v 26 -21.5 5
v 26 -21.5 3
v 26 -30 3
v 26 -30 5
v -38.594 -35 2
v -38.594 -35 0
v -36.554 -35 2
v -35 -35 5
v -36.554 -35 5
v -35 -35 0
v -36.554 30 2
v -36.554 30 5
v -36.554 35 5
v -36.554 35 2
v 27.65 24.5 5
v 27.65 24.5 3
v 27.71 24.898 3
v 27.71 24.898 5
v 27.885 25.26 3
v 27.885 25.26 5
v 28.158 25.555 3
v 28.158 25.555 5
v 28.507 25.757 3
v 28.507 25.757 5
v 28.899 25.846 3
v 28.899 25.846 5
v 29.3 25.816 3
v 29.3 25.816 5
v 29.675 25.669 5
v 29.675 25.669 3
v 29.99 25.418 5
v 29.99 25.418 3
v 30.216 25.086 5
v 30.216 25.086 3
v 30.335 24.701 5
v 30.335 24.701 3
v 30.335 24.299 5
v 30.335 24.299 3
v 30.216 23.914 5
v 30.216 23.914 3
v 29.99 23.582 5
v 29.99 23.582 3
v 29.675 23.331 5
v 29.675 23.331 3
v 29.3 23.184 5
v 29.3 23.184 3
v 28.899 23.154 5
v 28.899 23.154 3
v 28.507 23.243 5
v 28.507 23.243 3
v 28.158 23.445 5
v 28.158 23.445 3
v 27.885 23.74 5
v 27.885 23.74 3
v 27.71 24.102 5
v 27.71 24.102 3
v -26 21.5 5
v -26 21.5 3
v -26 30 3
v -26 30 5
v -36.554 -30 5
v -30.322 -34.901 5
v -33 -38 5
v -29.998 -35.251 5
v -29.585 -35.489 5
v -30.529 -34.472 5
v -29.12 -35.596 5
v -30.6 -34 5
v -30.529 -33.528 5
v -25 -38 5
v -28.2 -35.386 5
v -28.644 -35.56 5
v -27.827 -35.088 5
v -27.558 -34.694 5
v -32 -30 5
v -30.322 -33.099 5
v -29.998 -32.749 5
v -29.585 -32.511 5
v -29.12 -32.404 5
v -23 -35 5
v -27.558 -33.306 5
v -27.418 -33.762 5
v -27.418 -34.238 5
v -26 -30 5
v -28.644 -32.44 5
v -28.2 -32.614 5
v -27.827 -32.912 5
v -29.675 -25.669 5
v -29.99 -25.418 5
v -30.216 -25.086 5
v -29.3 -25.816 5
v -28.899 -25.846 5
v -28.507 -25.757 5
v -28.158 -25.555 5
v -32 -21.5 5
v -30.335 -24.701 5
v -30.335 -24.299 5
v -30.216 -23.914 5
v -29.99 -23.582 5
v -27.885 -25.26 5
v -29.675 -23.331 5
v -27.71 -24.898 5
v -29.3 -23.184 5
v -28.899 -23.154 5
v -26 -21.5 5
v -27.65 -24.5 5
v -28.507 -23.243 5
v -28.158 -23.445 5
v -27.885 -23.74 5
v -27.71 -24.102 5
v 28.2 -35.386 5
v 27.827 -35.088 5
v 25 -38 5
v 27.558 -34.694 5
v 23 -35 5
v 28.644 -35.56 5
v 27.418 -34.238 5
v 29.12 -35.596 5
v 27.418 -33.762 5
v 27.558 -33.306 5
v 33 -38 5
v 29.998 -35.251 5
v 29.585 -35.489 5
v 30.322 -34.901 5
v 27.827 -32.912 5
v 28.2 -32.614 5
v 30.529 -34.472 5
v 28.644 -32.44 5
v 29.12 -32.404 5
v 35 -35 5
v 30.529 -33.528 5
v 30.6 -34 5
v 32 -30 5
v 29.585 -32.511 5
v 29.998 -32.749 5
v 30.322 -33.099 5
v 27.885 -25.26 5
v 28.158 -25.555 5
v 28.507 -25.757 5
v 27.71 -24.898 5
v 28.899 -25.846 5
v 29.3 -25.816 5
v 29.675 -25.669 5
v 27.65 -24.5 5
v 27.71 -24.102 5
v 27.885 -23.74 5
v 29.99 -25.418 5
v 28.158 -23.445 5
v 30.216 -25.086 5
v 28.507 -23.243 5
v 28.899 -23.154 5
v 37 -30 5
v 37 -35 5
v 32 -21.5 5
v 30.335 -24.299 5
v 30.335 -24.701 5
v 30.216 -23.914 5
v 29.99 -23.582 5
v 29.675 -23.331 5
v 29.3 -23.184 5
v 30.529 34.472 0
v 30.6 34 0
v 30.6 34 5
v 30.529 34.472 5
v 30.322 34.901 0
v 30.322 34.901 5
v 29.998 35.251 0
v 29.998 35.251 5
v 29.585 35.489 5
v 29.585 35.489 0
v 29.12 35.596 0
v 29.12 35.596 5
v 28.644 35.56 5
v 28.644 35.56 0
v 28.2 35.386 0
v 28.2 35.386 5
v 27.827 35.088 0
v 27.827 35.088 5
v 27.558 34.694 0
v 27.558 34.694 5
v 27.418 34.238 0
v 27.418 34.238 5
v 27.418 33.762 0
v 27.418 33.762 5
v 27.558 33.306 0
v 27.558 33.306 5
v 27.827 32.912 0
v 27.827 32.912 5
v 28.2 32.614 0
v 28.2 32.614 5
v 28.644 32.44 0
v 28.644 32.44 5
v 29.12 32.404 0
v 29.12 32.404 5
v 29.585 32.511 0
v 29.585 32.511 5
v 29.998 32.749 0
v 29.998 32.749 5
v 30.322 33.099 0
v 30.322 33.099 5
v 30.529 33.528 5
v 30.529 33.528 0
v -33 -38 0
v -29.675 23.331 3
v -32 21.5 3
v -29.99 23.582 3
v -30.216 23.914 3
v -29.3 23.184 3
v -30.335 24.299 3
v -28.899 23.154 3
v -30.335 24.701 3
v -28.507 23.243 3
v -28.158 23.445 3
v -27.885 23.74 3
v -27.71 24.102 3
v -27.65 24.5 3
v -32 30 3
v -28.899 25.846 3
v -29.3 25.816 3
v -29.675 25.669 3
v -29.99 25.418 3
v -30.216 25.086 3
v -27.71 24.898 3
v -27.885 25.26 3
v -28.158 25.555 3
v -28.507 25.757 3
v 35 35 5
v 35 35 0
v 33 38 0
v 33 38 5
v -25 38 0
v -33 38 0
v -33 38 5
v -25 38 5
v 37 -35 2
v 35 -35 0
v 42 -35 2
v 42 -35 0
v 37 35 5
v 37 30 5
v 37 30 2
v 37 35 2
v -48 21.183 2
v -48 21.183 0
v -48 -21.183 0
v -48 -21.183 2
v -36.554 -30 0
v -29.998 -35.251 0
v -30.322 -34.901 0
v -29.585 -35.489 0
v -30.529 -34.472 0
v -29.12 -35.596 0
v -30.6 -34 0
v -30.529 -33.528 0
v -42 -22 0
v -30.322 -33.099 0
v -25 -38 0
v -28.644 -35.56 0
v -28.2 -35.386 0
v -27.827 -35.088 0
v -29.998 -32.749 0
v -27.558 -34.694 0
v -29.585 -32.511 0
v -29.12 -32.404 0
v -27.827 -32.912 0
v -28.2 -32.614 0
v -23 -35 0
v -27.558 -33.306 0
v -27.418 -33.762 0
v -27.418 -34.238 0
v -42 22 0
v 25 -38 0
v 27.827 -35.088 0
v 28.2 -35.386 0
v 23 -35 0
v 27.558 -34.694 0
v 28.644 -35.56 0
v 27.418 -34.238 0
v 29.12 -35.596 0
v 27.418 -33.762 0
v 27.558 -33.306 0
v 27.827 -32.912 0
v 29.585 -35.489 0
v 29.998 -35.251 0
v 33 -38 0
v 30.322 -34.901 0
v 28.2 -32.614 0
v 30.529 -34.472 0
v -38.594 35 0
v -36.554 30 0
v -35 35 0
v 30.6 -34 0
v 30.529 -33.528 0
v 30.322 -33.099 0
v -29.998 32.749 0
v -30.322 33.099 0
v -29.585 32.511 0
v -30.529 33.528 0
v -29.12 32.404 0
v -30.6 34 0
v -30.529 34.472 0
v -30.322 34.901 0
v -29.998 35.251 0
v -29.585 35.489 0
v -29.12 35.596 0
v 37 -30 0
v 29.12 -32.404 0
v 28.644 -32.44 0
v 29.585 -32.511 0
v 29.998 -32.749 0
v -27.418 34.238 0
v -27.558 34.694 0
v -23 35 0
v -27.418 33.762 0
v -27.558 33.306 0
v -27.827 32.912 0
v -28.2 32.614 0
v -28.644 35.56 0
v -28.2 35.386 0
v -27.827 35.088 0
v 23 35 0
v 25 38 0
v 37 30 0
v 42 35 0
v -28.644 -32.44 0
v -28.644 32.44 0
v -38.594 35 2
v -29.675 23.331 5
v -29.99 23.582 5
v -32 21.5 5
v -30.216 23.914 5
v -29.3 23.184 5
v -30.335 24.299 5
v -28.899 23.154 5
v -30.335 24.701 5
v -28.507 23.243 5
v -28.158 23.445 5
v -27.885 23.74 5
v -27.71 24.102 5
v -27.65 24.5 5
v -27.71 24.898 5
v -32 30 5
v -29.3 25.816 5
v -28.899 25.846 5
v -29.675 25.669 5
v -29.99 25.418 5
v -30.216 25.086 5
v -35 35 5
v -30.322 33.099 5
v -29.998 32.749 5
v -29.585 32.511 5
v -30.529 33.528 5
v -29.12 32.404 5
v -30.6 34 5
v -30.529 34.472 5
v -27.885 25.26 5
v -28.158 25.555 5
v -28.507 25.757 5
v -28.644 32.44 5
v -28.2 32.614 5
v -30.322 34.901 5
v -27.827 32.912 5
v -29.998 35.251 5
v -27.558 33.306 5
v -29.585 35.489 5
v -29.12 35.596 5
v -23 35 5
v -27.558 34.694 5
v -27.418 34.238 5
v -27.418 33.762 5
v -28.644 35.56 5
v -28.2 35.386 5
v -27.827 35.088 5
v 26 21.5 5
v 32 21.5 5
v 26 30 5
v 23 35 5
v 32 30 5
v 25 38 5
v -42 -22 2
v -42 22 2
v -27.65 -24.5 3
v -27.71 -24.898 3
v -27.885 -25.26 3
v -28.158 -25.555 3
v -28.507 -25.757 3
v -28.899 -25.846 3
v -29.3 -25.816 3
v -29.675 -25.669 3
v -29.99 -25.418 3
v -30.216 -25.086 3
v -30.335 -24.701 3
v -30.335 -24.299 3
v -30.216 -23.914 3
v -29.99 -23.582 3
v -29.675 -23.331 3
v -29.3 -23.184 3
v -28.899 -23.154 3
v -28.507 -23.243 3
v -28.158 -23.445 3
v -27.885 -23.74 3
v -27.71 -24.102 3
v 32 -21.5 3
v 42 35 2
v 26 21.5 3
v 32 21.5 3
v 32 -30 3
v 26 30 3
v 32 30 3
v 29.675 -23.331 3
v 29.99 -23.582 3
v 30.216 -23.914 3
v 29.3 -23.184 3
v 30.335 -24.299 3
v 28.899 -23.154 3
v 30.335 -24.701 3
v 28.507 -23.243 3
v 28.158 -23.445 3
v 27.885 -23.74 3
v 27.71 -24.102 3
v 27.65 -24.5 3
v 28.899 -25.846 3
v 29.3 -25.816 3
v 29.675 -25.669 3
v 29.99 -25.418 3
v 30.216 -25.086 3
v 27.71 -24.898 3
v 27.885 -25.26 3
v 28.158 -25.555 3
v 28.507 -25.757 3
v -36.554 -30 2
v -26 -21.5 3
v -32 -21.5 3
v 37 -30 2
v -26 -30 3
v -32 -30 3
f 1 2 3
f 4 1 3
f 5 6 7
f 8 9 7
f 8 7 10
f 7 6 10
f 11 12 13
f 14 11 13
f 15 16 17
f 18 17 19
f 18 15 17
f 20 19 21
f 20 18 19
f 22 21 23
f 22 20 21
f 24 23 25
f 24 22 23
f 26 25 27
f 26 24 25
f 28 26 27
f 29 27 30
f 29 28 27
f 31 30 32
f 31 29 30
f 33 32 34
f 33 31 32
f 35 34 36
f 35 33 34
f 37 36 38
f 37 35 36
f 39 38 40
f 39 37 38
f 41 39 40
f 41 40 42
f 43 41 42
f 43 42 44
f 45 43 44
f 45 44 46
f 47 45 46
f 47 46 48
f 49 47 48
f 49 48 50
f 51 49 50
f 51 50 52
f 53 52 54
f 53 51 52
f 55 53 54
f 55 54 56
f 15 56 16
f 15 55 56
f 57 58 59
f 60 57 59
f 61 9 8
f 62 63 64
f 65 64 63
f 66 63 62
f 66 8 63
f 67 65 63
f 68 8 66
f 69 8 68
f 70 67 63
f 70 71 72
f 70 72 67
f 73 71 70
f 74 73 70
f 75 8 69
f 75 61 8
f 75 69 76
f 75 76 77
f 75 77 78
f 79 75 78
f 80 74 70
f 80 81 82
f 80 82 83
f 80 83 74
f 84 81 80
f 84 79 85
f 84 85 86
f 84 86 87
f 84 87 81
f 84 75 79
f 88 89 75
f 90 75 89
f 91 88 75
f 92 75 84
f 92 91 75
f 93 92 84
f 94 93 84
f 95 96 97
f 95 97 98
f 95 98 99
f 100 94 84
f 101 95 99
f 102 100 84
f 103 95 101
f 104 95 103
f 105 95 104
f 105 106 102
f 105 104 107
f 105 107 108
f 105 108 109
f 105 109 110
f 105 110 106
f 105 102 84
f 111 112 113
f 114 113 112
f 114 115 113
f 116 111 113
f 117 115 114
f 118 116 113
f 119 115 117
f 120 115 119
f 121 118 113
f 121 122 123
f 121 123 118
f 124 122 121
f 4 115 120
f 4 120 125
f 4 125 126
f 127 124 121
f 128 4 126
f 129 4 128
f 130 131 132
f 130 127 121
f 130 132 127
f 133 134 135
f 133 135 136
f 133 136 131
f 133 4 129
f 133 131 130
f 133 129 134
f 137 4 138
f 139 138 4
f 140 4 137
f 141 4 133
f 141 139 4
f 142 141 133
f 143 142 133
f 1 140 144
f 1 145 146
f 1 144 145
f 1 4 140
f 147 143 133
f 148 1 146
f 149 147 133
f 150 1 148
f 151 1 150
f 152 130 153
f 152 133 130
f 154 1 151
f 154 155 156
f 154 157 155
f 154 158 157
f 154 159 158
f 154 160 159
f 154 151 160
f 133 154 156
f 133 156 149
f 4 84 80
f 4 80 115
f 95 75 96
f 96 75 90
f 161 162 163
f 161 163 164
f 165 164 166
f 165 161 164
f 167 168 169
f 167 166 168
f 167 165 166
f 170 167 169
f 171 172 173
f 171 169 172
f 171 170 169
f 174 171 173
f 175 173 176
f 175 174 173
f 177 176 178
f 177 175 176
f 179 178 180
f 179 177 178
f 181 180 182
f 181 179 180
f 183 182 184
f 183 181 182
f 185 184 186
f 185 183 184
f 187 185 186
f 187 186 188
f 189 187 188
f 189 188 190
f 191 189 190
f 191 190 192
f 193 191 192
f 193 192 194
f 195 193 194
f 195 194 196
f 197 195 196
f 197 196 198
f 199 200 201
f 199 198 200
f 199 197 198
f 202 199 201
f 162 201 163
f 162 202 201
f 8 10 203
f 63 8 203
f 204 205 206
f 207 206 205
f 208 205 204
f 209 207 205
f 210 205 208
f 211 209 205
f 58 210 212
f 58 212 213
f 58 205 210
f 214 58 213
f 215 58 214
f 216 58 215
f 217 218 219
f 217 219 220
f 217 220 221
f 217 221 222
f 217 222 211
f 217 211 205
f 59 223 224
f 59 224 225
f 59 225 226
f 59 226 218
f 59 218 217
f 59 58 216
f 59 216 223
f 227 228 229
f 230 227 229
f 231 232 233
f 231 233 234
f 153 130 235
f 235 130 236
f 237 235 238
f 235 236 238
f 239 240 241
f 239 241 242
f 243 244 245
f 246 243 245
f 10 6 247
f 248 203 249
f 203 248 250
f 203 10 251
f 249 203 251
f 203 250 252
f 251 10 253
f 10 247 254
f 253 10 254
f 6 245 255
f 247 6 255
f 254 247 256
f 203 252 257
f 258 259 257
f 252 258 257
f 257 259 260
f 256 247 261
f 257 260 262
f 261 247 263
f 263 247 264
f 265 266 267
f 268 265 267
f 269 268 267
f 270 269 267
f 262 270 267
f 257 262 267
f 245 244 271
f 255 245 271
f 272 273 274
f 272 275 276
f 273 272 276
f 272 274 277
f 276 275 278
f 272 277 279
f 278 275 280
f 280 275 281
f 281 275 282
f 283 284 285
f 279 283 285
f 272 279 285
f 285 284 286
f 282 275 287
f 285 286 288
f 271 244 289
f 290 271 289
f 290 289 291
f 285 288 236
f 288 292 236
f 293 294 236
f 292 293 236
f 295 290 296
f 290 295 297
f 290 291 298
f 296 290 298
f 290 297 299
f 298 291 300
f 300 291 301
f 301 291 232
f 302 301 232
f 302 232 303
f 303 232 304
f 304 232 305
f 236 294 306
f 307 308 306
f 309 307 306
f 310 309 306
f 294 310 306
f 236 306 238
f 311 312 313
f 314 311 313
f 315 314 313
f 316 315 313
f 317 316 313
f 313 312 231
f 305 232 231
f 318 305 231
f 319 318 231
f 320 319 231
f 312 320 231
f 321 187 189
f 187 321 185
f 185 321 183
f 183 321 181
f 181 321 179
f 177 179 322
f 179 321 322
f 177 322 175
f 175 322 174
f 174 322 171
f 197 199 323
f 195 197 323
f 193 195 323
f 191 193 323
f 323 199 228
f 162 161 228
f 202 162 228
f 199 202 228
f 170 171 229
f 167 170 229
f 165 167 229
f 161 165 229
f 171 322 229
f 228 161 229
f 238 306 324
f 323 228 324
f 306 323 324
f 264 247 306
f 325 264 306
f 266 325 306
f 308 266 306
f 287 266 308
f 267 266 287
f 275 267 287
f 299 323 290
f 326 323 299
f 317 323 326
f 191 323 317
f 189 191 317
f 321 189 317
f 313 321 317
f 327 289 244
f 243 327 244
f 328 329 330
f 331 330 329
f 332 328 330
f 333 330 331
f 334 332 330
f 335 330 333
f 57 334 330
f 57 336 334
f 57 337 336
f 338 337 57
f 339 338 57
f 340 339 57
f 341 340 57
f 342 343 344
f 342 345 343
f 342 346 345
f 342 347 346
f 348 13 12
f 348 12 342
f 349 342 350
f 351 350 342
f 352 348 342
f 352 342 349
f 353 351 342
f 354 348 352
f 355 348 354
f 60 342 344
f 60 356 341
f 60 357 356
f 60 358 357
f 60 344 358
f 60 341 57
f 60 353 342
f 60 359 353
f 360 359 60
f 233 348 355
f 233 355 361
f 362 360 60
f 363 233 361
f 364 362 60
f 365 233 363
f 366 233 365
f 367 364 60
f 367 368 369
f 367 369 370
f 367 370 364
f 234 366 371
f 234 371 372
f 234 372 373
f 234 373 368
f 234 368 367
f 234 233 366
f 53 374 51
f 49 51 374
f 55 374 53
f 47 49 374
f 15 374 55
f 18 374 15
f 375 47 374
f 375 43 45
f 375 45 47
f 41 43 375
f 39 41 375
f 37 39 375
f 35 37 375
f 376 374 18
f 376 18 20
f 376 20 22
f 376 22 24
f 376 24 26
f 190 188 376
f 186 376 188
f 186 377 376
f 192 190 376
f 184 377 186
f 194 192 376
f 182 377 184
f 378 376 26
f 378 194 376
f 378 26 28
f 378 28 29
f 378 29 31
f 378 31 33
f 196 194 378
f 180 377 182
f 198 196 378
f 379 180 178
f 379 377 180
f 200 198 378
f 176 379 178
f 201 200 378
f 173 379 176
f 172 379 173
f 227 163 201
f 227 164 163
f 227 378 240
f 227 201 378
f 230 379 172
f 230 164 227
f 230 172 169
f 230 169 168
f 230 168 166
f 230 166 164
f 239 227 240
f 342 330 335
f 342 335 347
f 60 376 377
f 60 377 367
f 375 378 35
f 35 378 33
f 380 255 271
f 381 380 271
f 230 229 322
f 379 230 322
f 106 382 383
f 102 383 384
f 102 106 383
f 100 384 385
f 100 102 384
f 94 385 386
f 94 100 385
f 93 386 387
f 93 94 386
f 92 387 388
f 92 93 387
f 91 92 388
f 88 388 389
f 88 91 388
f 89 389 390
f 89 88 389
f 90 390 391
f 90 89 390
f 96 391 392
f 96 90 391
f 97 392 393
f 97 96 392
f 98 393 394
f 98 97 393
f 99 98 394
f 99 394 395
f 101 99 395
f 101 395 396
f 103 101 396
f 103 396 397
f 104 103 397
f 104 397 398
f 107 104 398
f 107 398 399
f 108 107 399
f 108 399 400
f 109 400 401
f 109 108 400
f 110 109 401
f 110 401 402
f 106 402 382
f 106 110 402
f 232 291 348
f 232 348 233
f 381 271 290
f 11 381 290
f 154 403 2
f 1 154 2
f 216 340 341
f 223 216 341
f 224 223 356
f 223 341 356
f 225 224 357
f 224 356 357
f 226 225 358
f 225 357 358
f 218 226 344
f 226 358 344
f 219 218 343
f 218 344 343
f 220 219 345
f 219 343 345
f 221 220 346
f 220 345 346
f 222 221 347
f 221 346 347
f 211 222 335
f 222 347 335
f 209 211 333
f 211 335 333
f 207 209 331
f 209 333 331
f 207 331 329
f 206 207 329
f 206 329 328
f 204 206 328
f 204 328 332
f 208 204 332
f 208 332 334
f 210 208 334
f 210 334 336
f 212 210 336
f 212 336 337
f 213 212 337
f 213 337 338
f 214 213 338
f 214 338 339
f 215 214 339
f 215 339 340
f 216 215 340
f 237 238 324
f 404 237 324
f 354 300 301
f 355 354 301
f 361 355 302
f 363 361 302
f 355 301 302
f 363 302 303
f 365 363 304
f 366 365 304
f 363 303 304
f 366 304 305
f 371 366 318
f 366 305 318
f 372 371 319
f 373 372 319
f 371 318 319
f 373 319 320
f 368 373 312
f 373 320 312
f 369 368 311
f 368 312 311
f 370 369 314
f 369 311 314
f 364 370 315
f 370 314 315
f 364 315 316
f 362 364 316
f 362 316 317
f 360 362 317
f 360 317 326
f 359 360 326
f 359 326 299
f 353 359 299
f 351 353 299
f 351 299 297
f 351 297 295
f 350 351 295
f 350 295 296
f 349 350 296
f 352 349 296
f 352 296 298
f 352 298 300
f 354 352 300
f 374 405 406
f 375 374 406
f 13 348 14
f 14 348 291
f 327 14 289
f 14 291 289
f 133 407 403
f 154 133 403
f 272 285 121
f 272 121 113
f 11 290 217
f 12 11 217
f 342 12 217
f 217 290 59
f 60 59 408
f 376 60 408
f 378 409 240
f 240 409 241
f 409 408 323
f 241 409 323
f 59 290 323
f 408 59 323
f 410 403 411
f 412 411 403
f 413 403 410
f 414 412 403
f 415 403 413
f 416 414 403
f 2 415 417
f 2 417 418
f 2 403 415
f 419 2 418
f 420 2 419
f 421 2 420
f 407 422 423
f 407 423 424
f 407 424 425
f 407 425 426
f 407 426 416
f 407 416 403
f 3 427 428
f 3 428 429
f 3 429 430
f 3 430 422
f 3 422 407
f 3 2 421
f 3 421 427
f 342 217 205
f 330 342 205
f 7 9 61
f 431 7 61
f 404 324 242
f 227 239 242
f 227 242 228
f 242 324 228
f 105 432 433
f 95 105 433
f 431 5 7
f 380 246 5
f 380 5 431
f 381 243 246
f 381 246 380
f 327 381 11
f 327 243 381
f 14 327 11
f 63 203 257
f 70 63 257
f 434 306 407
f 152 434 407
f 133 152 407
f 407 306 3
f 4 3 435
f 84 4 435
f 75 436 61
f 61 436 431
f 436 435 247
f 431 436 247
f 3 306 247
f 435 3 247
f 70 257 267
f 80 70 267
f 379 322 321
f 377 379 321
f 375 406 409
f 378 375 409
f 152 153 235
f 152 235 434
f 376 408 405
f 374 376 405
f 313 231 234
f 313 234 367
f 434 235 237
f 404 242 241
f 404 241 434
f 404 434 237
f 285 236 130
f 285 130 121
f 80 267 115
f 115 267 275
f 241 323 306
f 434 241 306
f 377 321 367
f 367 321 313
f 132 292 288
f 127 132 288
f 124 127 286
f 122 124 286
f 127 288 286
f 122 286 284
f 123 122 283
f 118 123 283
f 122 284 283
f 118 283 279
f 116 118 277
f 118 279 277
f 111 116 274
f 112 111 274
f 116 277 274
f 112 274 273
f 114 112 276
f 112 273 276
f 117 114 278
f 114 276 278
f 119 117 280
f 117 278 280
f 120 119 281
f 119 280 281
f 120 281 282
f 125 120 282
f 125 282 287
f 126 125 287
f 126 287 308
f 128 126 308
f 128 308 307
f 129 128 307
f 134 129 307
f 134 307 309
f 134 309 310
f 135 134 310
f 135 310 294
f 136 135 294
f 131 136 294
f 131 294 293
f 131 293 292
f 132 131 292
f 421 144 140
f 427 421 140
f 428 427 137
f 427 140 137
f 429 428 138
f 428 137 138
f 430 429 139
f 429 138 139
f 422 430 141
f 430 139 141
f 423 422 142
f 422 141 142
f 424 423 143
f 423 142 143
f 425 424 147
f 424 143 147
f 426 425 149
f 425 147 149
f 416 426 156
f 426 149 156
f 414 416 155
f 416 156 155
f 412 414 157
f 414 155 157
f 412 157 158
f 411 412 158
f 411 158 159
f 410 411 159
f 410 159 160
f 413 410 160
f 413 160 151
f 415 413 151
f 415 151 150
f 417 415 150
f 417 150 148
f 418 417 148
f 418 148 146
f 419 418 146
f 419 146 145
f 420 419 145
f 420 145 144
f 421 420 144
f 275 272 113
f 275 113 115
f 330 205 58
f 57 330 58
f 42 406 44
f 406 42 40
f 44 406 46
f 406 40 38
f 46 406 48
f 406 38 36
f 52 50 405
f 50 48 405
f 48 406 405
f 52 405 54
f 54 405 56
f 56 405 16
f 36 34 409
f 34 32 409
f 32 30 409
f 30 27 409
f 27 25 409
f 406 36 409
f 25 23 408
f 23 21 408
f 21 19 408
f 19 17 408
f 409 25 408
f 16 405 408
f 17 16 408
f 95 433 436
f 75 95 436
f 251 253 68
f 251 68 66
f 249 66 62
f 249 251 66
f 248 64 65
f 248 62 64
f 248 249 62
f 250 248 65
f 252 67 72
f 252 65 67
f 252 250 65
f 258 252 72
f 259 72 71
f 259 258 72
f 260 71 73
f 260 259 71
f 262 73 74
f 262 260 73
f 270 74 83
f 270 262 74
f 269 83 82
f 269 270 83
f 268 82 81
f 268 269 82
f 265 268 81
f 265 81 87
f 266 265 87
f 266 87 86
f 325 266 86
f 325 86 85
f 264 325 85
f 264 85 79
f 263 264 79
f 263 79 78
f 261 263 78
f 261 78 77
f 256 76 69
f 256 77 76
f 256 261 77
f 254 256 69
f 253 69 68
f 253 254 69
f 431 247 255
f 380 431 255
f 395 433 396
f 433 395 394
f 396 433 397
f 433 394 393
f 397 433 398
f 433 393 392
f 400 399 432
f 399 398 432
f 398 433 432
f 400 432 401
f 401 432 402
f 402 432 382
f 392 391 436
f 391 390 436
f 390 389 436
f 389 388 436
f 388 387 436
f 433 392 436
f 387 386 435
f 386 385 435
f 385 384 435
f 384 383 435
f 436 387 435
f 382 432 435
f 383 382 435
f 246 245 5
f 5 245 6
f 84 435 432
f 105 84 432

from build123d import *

# Parameters (mm, degrees)
BODY_DEPTH                       = 5
SIDE_EXTRUSION_DEPTH             = 5
MOUNTING_HOLE_D                  = 3.2
MOUNTING_CUTOUT_REACH            = 80.058
SKETCH7_W                        = 3
SKETCH7_H                        = 8.5
SKETCH8_R                        = 1.35
MOUNTING_HOLE_CUTOUT_DEPTH       = 62.424750712
MOUNTING_MIRROR2_COPY_1_DEPTH    = 5
MOUNTING_MIRROR2_COPY_2_D        = 3.2
MOUNTING_MIRROR2_COPY_3_REACH    = 80.058
MOUNTING_MIRROR2_COPY_3_SKETCH_W = 3
MOUNTING_MIRROR2_COPY_3_SKETCH_H = 8.5
MOUNTING_MIRROR2_COPY_4_SKETCH_R = 1.35
MOUNTING_MIRROR2_COPY_4_DEPTH    = 62.424750712
SKETCH9_W                        = 5
SKETCH9_H                        = 70
SKETCH9_W_2                      = 11.445654338
RPI_SPACING_CUTOUT_DEPTH         = 3


with BuildPart() as part:
    # Sketch3 → body (new body)
    with BuildSketch(Plane.XY):
        Polygon((-48, 21.182653996), (-48, -21.182653996), (-38.594438725, -35), (42, -35), (42, 35), (-38.594438725, 35), align=None)
        Polygon((-26, 21.5), (-26, 30), (26, 30), (26, 21.5), (32, 21.5), (32, 30), (37, 30), (37, -30), (32, -30), (32, -21.5), (26, -21.5), (26, -30), (-26, -30), (-26, -21.5), (-32, -21.5), (-32, -30), (-36.554345662, -30), (-42, -22), (-42, 22), (-36.554345662, 30), (-32, 30), (-32, 21.5), align=None, mode=Mode.SUBTRACT)
    extrude(amount=BODY_DEPTH)

    # Sketch4 → side_extrusion (add)
    with BuildSketch(Plane.XY):
        Polygon((-35, 35), (-33, 38), (-25, 38), (-23, 35), align=None)
    side_extrusion = extrude(amount=SIDE_EXTRUSION_DEPTH)

    # mounting_hole (through all)
    with Locations(Plane.XY.offset(5)):
        with Locations((-29, 34)):
            mounting_hole = Hole(MOUNTING_HOLE_D / 2)

    # Sketch7 → mounting_cutout (cut, up to next)
    with BuildSketch(Plane(origin=(-26, 0, 0), x_dir=(0, 0, -1), z_dir=(1, 0, 0)), mode=Mode.PRIVATE) as mounting_cutout_sk1:
        with Locations((-1.5, 25.75)):
            Rectangle(SKETCH7_W, SKETCH7_H)
    mounting_cutout_tool1 = extrude(mounting_cutout_sk1.sketch, amount=-MOUNTING_CUTOUT_REACH, mode=Mode.PRIVATE) & part.part
    mounting_cutout = mounting_cutout_tool1.solids().sort_by_distance((-26, 25.75, 1.5))[0]
    add(mounting_cutout, mode=Mode.SUBTRACT)

    # Sketch8 → mounting_hole_cutout (cut, through all)
    with BuildSketch(Plane.XY.offset(5)):
        with Locations((-29, 24.5)):
            Circle(SKETCH8_R)
    mounting_hole_cutout = extrude(amount=-MOUNTING_HOLE_CUTOUT_DEPTH, mode=Mode.SUBTRACT)

    # mounting_mirror1: side_extrusion, mounting_hole, mounting_cutout, mounting_hole_cutout across plane
    add(side_extrusion.mirror(Plane(origin=(0, 0, 0), x_dir=(0, 0, 1), z_dir=(1, 0, 0))))
    add(mounting_hole.mirror(Plane(origin=(0, 0, 0), x_dir=(0, 0, 1), z_dir=(1, 0, 0))), mode=Mode.SUBTRACT)
    add(mounting_cutout.mirror(Plane(origin=(0, 0, 0), x_dir=(0, 0, 1), z_dir=(1, 0, 0))), mode=Mode.SUBTRACT)
    add(mounting_hole_cutout.mirror(Plane(origin=(0, 0, 0), x_dir=(0, 0, 1), z_dir=(1, 0, 0))), mode=Mode.SUBTRACT)

    # mounting_mirror2: side_extrusion, mounting_hole, mounting_cutout, mounting_hole_cutout across plane
    add(side_extrusion.mirror(Plane.ZX))
    add(mounting_hole.mirror(Plane.ZX), mode=Mode.SUBTRACT)
    add(mounting_cutout.mirror(Plane.ZX), mode=Mode.SUBTRACT)
    add(mounting_hole_cutout.mirror(Plane.ZX), mode=Mode.SUBTRACT)

    # mounting_mirror2 copy 1 sketch → mounting_mirror2 copy 1 (add)
    with BuildSketch(Plane(origin=(0, 0, 0), x_dir=(-1, 0, 0), z_dir=(0, 0, 1))):
        Polygon((-35, 35), (-33, 38), (-25, 38), (-23, 35), align=None)
    extrude(amount=MOUNTING_MIRROR2_COPY_1_DEPTH)

    # mounting_mirror2 copy 2 (through all)
    with Locations(Plane(origin=(0, 0, 5), x_dir=(-1, 0, 0), z_dir=(0, 0, 1))):
        with Locations((-29, 34)):
            Hole(MOUNTING_MIRROR2_COPY_2_D / 2)

    # mounting_mirror2 copy 3 sketch → mounting_mirror2 copy 3 (cut, up to next)
    with BuildSketch(Plane(origin=(26, 0, 0), x_dir=(0, 0, -1), z_dir=(-1, 0, 0)), mode=Mode.PRIVATE) as mounting_mirror2_copy_3_sk1:
        with Locations((-1.5, 25.75)):
            Rectangle(MOUNTING_MIRROR2_COPY_3_SKETCH_W, MOUNTING_MIRROR2_COPY_3_SKETCH_H)
    mounting_mirror2_copy_3_tool1 = extrude(mounting_mirror2_copy_3_sk1.sketch, amount=-MOUNTING_MIRROR2_COPY_3_REACH, mode=Mode.PRIVATE) & part.part
    add(mounting_mirror2_copy_3_tool1.solids().sort_by_distance((26, -25.75, 1.5))[0], mode=Mode.SUBTRACT)

    # mounting_mirror2 copy 4 sketch → mounting_mirror2 copy 4 (cut, through all)
    with BuildSketch(Plane(origin=(0, 0, 5), x_dir=(-1, 0, 0), z_dir=(0, 0, 1))):
        with Locations((-29, 24.5)):
            Circle(MOUNTING_MIRROR2_COPY_4_SKETCH_R)
    extrude(amount=-MOUNTING_MIRROR2_COPY_4_DEPTH, mode=Mode.SUBTRACT)

    # Sketch9 → rpi_spacing_cutout (cut)
    with BuildSketch(Plane.XY.offset(5)):
        with Locations((39.5, 0)):
            Rectangle(SKETCH9_W, SKETCH9_H)
        with Locations((-42.277172831, 0)):
            Rectangle(SKETCH9_W_2, SKETCH9_H)
    extrude(amount=-RPI_SPACING_CUTOUT_DEPTH, mode=Mode.SUBTRACT)


solid = part.part
